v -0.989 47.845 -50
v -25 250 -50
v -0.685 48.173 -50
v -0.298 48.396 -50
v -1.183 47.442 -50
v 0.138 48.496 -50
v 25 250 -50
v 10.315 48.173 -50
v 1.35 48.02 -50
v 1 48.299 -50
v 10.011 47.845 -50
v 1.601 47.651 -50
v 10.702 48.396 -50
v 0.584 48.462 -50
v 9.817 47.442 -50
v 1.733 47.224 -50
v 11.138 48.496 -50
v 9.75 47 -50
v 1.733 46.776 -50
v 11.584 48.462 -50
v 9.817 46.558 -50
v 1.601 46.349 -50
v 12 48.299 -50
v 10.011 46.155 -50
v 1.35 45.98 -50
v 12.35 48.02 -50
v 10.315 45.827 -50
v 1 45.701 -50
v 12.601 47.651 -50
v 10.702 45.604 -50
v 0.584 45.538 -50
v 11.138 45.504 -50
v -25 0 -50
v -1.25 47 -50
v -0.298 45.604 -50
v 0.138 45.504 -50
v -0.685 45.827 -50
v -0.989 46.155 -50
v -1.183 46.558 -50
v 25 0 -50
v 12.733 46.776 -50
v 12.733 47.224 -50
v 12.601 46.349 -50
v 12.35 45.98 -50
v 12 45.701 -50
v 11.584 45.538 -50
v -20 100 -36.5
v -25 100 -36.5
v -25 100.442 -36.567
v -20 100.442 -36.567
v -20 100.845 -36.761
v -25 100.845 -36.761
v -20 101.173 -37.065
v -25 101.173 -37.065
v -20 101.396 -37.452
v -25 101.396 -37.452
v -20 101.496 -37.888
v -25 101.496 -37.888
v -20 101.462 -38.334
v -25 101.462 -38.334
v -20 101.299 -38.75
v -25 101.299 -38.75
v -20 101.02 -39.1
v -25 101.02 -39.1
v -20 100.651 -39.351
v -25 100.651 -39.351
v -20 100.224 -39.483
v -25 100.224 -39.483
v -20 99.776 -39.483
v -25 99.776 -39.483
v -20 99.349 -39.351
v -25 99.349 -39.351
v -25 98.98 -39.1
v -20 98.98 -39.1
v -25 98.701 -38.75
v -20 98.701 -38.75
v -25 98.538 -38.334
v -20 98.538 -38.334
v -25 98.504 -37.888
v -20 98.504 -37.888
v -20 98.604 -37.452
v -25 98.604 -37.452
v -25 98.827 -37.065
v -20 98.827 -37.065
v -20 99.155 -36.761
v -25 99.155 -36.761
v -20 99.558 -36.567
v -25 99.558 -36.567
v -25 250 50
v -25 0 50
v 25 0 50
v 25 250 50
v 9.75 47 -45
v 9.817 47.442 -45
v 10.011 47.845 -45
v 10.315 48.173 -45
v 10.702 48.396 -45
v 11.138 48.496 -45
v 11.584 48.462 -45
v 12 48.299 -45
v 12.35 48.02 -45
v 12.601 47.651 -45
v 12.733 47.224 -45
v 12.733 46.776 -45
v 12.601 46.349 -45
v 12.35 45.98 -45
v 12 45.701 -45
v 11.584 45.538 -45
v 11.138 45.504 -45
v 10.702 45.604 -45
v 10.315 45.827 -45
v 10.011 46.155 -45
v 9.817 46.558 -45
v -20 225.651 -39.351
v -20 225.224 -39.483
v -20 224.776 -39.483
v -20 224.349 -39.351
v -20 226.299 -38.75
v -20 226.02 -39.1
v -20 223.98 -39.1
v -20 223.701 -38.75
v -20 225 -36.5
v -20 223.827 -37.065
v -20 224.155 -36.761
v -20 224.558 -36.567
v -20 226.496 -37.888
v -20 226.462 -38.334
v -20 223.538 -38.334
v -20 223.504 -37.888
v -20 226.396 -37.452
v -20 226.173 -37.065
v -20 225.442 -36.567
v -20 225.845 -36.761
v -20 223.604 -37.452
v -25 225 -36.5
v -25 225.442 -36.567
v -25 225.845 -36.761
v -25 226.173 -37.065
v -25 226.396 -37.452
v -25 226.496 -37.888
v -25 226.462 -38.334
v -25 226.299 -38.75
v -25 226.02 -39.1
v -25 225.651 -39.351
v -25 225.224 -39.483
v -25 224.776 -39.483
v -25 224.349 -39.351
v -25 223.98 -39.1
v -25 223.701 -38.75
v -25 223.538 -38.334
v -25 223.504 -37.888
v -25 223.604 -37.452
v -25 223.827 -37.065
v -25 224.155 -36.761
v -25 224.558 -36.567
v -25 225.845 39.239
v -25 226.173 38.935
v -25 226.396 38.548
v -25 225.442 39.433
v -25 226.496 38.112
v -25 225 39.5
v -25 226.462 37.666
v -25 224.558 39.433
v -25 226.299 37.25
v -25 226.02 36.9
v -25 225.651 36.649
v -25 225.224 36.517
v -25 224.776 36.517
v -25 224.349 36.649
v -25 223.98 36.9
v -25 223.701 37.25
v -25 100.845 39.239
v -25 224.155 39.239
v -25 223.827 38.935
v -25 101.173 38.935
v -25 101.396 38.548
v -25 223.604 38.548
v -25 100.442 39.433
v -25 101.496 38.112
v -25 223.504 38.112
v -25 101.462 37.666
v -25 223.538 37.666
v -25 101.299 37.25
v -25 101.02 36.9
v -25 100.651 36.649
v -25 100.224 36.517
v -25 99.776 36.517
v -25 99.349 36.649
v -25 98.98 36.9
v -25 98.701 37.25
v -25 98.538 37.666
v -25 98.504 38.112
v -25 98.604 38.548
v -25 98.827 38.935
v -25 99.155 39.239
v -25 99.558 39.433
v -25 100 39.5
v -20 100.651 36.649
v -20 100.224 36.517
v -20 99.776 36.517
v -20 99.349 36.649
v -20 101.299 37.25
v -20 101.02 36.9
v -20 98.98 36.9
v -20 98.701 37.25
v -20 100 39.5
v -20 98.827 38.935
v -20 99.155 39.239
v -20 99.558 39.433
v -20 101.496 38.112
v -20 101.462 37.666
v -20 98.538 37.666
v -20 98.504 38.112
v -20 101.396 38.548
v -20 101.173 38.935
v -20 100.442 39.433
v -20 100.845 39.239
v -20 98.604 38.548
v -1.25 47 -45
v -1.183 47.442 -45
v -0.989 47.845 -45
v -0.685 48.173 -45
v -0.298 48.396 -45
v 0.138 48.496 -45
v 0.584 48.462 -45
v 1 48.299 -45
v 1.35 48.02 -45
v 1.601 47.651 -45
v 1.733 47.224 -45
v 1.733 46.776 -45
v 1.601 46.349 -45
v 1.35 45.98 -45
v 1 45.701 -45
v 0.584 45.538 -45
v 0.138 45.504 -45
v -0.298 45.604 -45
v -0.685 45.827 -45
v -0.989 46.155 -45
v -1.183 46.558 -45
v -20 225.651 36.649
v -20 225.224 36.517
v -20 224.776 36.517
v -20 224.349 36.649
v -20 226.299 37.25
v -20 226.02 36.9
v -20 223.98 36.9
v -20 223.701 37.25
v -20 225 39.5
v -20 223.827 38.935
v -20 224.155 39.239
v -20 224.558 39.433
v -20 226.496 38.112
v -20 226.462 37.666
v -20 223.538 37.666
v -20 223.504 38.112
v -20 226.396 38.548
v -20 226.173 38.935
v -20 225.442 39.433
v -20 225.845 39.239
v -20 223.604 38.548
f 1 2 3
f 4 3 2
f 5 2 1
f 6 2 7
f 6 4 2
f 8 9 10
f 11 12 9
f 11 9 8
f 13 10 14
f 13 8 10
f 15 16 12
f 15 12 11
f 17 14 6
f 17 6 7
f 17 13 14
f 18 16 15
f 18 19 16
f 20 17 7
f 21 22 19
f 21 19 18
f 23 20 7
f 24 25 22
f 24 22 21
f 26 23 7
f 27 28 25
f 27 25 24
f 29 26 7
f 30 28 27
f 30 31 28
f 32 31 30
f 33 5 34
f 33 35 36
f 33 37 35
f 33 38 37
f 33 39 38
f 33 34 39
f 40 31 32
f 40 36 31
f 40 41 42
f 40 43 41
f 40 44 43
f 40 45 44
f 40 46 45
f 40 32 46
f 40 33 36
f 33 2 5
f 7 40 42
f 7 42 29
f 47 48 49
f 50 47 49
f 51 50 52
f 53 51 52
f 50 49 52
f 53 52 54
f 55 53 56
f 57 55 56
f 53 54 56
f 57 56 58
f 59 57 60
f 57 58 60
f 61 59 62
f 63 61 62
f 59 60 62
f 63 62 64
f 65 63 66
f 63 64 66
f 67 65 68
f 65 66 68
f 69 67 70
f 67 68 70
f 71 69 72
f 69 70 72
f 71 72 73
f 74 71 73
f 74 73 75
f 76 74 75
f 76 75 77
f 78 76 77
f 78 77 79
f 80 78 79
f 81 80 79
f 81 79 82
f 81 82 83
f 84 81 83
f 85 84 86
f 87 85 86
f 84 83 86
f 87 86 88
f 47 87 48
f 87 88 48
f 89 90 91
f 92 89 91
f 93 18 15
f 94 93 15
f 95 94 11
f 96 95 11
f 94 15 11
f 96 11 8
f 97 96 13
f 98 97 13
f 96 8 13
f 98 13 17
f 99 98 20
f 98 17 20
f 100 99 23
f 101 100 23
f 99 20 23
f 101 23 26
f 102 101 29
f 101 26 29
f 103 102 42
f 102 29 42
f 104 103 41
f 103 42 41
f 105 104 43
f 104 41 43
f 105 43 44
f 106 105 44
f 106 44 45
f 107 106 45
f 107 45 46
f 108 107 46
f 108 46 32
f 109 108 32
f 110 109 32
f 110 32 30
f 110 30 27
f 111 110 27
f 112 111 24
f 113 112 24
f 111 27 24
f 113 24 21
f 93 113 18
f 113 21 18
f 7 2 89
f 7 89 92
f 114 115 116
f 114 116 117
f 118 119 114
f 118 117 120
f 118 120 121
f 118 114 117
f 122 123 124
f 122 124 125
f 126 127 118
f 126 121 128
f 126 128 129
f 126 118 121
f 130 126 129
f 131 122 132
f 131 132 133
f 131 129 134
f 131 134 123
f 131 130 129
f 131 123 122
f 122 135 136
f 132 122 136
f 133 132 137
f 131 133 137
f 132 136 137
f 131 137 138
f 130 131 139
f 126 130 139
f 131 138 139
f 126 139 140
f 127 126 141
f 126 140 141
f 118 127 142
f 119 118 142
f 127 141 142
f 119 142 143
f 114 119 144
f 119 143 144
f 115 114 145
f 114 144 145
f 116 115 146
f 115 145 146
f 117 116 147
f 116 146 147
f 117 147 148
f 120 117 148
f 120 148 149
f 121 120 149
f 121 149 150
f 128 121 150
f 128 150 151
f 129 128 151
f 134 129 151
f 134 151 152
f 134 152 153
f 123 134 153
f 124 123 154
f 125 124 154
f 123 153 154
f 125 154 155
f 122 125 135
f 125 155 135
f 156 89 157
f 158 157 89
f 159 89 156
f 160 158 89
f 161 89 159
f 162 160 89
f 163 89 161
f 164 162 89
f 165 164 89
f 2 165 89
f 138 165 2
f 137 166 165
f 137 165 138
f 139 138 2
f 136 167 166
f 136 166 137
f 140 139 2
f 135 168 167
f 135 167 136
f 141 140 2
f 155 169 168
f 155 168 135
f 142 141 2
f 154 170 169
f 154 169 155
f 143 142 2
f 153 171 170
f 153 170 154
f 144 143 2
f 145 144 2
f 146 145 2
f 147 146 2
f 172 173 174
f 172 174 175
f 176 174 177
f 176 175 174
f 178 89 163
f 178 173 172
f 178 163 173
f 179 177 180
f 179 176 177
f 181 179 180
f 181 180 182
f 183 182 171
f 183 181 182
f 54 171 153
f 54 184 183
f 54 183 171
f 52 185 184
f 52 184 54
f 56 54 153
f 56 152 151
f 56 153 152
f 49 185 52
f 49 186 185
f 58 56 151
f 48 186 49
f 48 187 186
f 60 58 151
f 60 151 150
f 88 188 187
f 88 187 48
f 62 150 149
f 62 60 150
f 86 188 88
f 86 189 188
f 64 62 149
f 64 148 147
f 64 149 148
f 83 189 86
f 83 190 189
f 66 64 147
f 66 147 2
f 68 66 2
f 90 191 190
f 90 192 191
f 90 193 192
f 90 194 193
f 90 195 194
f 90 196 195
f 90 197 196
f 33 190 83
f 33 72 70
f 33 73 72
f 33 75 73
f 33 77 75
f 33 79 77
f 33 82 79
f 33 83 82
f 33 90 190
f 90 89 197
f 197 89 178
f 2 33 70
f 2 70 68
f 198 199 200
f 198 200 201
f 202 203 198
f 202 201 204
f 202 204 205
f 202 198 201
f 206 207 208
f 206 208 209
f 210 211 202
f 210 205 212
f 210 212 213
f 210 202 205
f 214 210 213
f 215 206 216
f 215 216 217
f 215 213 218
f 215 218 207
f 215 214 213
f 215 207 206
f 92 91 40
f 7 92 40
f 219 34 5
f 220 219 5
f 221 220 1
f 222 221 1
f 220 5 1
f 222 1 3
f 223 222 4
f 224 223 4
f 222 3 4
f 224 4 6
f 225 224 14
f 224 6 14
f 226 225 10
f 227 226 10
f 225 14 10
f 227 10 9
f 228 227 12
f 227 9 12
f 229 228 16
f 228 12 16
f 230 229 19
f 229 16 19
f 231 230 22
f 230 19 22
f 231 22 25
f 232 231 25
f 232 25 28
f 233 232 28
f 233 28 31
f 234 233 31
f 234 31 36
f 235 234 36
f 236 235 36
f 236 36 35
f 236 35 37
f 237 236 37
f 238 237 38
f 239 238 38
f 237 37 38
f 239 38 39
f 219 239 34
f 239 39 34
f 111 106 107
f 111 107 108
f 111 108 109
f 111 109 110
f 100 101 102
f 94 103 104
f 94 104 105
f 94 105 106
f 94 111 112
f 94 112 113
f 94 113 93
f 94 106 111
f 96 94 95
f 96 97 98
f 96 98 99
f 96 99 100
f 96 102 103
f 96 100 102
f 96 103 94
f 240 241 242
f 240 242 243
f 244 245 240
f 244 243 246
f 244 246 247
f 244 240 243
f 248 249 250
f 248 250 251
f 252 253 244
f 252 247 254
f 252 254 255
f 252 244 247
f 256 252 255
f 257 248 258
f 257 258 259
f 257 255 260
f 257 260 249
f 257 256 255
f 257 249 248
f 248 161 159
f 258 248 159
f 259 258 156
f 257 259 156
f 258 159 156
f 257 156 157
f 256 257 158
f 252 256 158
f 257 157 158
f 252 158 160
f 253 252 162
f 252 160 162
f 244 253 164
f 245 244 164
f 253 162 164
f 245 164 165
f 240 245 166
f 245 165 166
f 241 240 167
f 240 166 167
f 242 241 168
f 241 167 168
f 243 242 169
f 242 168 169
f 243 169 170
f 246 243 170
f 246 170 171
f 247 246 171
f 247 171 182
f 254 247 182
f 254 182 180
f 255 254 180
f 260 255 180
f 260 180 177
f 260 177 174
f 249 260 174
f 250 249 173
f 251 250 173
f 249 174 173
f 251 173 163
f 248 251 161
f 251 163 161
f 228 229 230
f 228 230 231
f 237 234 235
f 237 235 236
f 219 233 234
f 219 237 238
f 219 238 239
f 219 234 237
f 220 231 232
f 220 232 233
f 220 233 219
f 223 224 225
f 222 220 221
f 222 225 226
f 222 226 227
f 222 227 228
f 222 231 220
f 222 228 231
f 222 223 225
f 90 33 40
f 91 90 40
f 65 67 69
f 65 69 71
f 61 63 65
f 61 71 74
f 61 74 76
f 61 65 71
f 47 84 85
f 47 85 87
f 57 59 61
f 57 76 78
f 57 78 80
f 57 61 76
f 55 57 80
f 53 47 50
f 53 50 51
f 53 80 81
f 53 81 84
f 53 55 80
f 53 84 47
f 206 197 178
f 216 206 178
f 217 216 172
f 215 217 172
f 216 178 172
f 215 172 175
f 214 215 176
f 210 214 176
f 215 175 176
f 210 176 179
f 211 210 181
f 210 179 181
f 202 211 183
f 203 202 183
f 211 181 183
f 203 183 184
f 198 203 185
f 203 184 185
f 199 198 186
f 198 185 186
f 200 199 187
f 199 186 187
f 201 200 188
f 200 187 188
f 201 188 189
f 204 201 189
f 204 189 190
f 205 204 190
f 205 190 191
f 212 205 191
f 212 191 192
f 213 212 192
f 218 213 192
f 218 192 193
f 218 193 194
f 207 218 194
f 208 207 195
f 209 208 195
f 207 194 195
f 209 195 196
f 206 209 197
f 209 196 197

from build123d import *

# Parameters (mm, degrees)
SKETCH1_W           = 50
SKETCH1_H           = 100
BOSS_EXTRUDE1_DEPTH = 250
SKETCH2_R           = 1.5
CUT_EXTRUDE1_DEPTH  = 5
SKETCH3_R           = 1.5
CUT_EXTRUDE2_DEPTH  = 5


with BuildPart() as part:
    # Sketch1 → Boss-Extrude1 (new body)
    with BuildSketch(Plane(origin=(0, 0, 0), x_dir=(1, 0, 0), z_dir=(0, 1, 0))):
        Rectangle(SKETCH1_W, SKETCH1_H)
    extrude(amount=BOSS_EXTRUDE1_DEPTH)

    # Sketch2 → Cut-Extrude1 (cut)
    with BuildSketch(Plane.ZY.offset(25)):
        with Locations((38, 225)):
            Circle(SKETCH2_R)
        with Locations((38, 100)):
            Circle(SKETCH2_R)
        with Locations((-38, 225)):
            Circle(SKETCH2_R)
        with Locations((-38, 100)):
            Circle(SKETCH2_R)
    extrude(amount=-CUT_EXTRUDE1_DEPTH, mode=Mode.SUBTRACT)

    # Sketch3 → Cut-Extrude2 (cut)
    with BuildSketch(Plane(origin=(0, 0, -50), x_dir=(-1, 0, 0), z_dir=(0, 0, -1))):
        with Locations((-0.25, 47)):
            Circle(SKETCH3_R)
        with Locations((-11.25, 47)):
            Circle(SKETCH3_R)
    extrude(amount=-CUT_EXTRUDE2_DEPTH, mode=Mode.SUBTRACT)


solid = part.part
